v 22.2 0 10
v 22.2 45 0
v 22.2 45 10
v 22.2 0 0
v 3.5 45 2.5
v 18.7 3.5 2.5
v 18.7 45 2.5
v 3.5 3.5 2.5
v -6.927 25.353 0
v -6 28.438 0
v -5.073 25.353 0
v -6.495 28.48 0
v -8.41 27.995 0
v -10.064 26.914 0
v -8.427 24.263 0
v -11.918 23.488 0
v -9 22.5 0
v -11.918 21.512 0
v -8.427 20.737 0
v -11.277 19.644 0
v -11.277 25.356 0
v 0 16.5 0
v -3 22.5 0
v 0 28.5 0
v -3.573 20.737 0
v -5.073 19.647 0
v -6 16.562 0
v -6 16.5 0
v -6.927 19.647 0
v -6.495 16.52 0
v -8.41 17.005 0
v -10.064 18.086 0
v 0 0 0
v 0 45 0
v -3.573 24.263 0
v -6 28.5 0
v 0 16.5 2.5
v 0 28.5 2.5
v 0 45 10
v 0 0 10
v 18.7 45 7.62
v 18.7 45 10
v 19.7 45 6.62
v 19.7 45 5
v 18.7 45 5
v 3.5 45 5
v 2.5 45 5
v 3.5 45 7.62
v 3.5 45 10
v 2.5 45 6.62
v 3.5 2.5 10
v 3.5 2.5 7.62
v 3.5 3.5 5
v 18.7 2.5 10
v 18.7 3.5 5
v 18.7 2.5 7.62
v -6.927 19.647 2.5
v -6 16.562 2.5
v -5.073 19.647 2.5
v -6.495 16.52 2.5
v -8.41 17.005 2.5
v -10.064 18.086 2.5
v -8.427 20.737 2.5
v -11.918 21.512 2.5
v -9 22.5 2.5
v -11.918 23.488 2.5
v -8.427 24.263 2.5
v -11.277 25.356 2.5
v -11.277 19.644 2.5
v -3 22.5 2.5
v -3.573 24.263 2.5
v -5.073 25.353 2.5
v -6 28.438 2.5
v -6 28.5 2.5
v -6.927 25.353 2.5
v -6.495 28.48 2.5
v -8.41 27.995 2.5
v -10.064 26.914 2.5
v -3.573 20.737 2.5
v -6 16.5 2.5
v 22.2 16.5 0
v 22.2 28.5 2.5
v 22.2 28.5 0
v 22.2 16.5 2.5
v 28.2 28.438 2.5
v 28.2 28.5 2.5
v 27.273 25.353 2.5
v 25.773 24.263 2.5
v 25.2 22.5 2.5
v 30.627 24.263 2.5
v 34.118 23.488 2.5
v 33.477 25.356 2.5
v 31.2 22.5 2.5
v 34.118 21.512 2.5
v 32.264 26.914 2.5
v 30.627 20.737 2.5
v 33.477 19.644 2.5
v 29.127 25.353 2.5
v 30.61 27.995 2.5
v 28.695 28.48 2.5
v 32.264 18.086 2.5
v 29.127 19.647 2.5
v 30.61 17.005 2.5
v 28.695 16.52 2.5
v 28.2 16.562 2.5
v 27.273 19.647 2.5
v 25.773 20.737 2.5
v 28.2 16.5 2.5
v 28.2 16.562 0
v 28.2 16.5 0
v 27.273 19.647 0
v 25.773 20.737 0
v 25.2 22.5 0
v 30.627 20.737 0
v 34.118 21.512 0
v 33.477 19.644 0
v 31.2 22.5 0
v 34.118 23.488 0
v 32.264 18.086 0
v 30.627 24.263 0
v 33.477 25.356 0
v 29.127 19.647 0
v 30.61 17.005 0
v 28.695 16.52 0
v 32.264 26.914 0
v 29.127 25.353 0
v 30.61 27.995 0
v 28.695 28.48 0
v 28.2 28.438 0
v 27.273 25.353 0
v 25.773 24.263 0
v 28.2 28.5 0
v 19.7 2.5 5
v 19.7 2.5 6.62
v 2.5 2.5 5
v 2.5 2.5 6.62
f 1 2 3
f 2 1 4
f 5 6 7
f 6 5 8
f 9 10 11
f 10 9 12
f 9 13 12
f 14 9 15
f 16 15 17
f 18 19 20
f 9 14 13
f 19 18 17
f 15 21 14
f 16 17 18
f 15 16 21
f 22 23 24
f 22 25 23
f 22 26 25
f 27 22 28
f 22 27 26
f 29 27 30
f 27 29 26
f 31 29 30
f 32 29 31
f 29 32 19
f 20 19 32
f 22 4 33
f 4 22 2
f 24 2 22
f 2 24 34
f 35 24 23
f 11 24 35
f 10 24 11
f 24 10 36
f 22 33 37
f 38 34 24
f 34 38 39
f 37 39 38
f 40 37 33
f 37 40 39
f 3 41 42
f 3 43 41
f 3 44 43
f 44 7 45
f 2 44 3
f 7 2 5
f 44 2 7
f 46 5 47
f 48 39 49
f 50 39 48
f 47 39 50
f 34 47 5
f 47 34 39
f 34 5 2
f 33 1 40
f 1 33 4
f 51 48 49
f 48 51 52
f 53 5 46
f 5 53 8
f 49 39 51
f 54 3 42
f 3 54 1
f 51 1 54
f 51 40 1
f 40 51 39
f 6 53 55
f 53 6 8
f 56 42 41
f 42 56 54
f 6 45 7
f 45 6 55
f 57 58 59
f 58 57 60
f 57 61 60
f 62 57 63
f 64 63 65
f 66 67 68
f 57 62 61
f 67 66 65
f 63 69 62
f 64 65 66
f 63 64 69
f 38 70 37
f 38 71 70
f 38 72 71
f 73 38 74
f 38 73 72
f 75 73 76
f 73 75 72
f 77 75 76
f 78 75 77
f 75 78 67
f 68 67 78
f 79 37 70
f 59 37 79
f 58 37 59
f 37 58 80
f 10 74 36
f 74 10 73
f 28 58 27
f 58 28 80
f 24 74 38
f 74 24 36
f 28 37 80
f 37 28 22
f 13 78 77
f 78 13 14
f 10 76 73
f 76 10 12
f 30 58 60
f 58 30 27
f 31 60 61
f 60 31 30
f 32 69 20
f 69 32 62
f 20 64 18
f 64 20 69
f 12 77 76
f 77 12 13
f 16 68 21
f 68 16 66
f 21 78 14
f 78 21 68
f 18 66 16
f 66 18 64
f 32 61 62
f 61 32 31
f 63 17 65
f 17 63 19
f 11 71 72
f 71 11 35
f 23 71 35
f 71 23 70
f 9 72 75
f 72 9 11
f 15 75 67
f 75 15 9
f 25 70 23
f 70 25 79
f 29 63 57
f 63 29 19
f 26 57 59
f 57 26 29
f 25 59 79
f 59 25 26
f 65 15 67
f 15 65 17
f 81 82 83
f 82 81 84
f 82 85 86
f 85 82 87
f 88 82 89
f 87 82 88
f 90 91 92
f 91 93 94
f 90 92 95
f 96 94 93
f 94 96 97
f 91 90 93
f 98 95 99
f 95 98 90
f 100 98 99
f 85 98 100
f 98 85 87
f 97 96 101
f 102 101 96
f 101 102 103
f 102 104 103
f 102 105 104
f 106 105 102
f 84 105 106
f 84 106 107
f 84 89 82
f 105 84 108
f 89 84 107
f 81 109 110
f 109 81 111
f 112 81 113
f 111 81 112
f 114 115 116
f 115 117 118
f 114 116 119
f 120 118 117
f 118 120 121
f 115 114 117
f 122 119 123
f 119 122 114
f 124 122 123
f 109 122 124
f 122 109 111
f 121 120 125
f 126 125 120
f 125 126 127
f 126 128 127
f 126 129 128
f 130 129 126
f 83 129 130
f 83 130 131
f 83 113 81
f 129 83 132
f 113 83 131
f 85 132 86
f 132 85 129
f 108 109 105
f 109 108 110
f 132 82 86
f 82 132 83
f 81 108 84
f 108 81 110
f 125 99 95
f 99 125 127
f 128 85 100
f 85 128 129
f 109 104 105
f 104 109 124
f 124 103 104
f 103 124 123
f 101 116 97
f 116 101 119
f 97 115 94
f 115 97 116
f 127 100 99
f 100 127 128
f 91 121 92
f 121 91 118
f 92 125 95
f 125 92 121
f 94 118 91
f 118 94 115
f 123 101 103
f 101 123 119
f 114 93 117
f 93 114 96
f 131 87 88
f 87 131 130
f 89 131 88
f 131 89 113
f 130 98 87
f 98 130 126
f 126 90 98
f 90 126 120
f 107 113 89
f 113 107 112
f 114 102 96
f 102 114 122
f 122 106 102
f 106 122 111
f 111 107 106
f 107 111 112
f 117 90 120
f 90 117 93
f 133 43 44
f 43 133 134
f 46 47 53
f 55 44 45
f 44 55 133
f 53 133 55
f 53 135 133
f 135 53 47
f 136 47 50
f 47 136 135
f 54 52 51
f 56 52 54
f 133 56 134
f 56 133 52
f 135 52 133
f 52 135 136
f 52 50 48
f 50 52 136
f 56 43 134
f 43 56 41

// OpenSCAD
/* bluetooth_mate_holder.scad
 * By John Biehler - November 17, 2011
 * http://www.thingiverse.com/thing: 

 * derived from pcb_box_slide_with_tabs.scad
 * By Nicholas C Lewis - Jan 1, 2011
 * http://www.thingiverse.com/thing:5396 
 *
 * derived from pcb_box_slide.scad 
 *     Parametric, open PCB-box (slide-in) by chlunde
 *     http://www.thingiverse.com/thing:4071
 *
 * CHANGES
 * - adjusted to fit Arduino Mega
 * - added mounting tabs
 * - turned off cutouts
 * - adjusted bottom cutout size
 */

//Uno is 2.7" x 2.1" which is 68.58 mm x 53.34 mm
//Round up to 69 mm x 54 mm
pcb_width = 17.2;
pcb_length =40;
pcb_height =1.62;
slisse = 1;

pcb_bottom_margin = 2.5;
wall_width_thick = 3.5;
wall_width = wall_width_thick-slisse;
box_height = 10;

//tab parameters
tab_hole_radius=3;
tab_outer_radius=6;



module tab() {
	difference(){
		union() {
			translate([-tab_outer_radius,-tab_outer_radius,0])
			cube([tab_outer_radius,2*tab_outer_radius,wall_width]);
			translate([-tab_outer_radius,0,0])
				cylinder(r=tab_outer_radius, h = wall_width);
		}
		translate([-tab_outer_radius,0,0])
		 cylinder(r= tab_hole_radius, h = wall_width+3,center=true);
	}

}

module box() {
  union() {
    cube([pcb_width + 2*wall_width, pcb_length + 2*wall_width, wall_width]);

    cube([wall_width_thick, pcb_length + 2*wall_width, box_height]);

    cube([pcb_width + 2*wall_width, wall_width_thick, box_height]);

    %translate([0, pcb_length+wall_width, 0])
      cube([pcb_width + 2*wall_width,wall_width,box_height]);

    translate([pcb_width + wall_width - slisse,0,0])
      cube([wall_width_thick, pcb_length + 2*wall_width, box_height]);
  }
//comment out this part to remove tabs
 for(i=[(pcb_length + 2*wall_width)/2]){
	translate([0,i,0])tab();
	translate([pcb_width + 2*wall_width,i,0])mirror()tab();
 }


}

module pcb() {
  translate([wall_width, wall_width, wall_width + pcb_bottom_margin])
    cube([pcb_width,pcb_length + wall_width + 0.1,pcb_height]);
  translate([wall_width, wall_width, wall_width + pcb_bottom_margin+pcb_height])rotate([0,45,0])
    cube([pcb_height,pcb_length + wall_width + 0.1,pcb_height]);
  translate([wall_width+pcb_width-2*cos(45)*pcb_height, wall_width, wall_width + pcb_bottom_margin+pcb_height])rotate([0,45,0])
    cube([pcb_height,pcb_length + wall_width + 0.1,pcb_height]);
  translate([wall_width_thick, wall_width, wall_width + pcb_bottom_margin])
    cube([pcb_width-2*slisse,pcb_length + wall_width + 0.1,box_height]);

}



module holes() {
  *translate([wall_width + pcb_width/2, wall_width_thick + 0.1, pcb_width/2+wall_width])
    rotate(a=90,v=[1,0,0])
      cylinder(r=pcb_width/2, h=wall_width_thick + 0.2);

  *translate([-0.1, wall_width + pcb_length/2, pcb_length/2 + wall_width])
    rotate(a=90,v=[0,1,0])
      cylinder(r=pcb_length/2, h=wall_width_thick + 0.2);

  *translate([pcb_width + wall_width - slisse - 0.1, wall_width + pcb_length/2, pcb_length/2 + wall_width])
    rotate(a=90,v=[0,1,0])
      cylinder(r=pcb_length/2, h=wall_width_thick + 0.2);

 * translate([pcb_width/2 + wall_width, wall_width + pcb_length/2, -0.1])
    rotate(a=0,v=[0,1,0])
      cylinder(r=min(pcb_length,pcb_width)/2 - wall_width/2, h=wall_width_thick + 0.2);
   
  inner_margin = 9;
  translate([inner_margin +wall_width, inner_margin+wall_width, -0.1])
    cube([pcb_width-inner_margin*2,pcb_length -inner_margin*2,wall_width + 0.2]);
}

difference() {
  box();
  pcb();
  holes();
}

* color([1,0,0])
  translate([pcb_width/2 + wall_width, wall_width + pcb_length/2, -0.1])
    rotate(a=0,v=[0,1,0])
      cylinder(r=min(pcb_length,pcb_width)/2 - wall_width/2, h=wall_width_thick + 0.2);
